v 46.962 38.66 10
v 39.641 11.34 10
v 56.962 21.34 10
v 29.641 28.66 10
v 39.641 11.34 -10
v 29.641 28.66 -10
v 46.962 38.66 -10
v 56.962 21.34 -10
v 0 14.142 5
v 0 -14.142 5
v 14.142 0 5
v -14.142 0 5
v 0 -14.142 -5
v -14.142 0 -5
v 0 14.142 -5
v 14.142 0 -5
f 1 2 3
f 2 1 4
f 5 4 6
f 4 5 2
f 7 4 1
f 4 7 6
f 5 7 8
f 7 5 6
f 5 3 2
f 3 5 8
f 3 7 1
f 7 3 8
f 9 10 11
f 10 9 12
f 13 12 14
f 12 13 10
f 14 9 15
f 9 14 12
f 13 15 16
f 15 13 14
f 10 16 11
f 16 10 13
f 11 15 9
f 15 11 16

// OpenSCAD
// file: utils/build_plate.scad
// Build Plate representation module
// Made by Makerbot (http://curriculum.makerbot.com/daily_lessons/february/openscad_buildplate.html)

//use this to include a build plate visualization in your openSCAD scripts. Very useful for things designed to be edited in Makerbot Customizer

//to use, either include or use <utils/build_plate.scad>

//then just call build_plate(); with the following arguments (also, you have to have a real object in your scene for this to render)

//putting 0 as the first argument will give you a Replicator 2 build plate
//putting 1 as the first argument will give you a Replicator 1 build plate
//putting 2 as the first argument will give you a Thingomatic build plate
//putting 3 as the first argument will give you a manually adjustable build plate (note: if you use this option, you need to specify your build plates X length (in mm) as the second argument and the Y length (in mm) as the third argument. eg. build_plate(3,150,120);)

/*

to give your user control of which build plate they see in Customizer, include the following code:

use <utils/build_plate.scad>

//for display only, doesn't contribute to final object
build_plate_selector = 0; //[0:Replicator 2,1: Replicator,2:Thingomatic,3:Manual]
//when Build Plate Selector is set to "manual" this controls the build plate x dimension
build_plate_manual_x = 100; //[100:400]
//when Build Plate Selector is set to "manual" this controls the build plate y dimension
build_plate_manual_y = 100; //[100:400]

build_plate(build_plate_selector,build_plate_manual_x,build_plate_manual_y);

*/




//to see how this works, uncomment the following code

//build_plate_selector = 0; //[0:Replicator 2,1: Replicator,2:Thingomatic,3:Manual]
//build_plate_manual_x = 100; //[100:400]
//build_plate_manual_y = 100; //[100:400]
//
//build_plate(build_plate_selector,build_plate_manual_x,build_plate_manual_y);
//
//cube(5);


module build_plate(bp,manX,manY){

		translate([0,0,-.52]){
			if(bp == 0){
				%cube([285,153,1],center = true);
			}
			if(bp == 1){
				%cube([225,145,1],center = true);
			}
			if(bp == 2){
				%cube([120,120,1],center = true);
			}
			if(bp == 3){
				%cube([manX,manY,1],center = true);
			}
		
		}
		translate([0,0,-.5]){
			if(bp == 0){
				for(i = [-14:14]){
					translate([i*10,0,0])
					%cube([.5,153,1.01],center = true);
				}
				for(i = [-7:7]){
					translate([0,i*10,0])
					%cube([285,.5,1.01],center = true);
				}	
			}
			if(bp == 1){
				for(i = [-11:11]){
					translate([i*10,0,0])
						%cube([.5,145,1.01],center = true);
				}
				for(i = [-7:7]){
					translate([0,i*10,0])
						%cube([225,.5,1.01],center = true);
				}
			}
			if(bp == 2){
				for(i = [-6:6]){
					translate([i*10,0,0])
						%cube([.5,120,1.01],center = true);
				}
				for(i = [-6:6]){
					translate([0,i*10,0])
						%cube([120,.5,1.01],center = true);
				}
			}
			if(bp == 3){
				for(i = [-(floor(manX/20)):floor(manX/20)]){
					translate([i*10,0,0])
						%cube([.5,manY,1.01],center = true);
				}
				for(i = [-(floor(manY/20)):floor(manY/20)]){
					translate([0,i*10,0])
						%cube([manX,.5,1.01],center = true);
				}
			}
		}
}
// main file
use <./utils/build_plate.scad> // Cuadricula transparente para la base
build_plate(3, 200,100); // No se incluye al renderizar


//----------------------------------------------------------
//-- Tutorial OpenScad
//-- Juan Gonzalez-Gomez (Obijuan) juan@iearobotics.com
//----------------------------------------------------------
//-- (c) Mayo, 2012
//-- Licencia GPL
//----------------------------------------------------------
//-- Ejemplo de translación y rotación
//----------------------------------------------------------

//-- Traslación y rotación de un cubo
rotate([0,0,30])
  translate([50,0,0])
    cube([20,20,20],center=true);

//-- rotación de un cubo
rotate([0,0,45])
  cube([20,20,10],center=true);
